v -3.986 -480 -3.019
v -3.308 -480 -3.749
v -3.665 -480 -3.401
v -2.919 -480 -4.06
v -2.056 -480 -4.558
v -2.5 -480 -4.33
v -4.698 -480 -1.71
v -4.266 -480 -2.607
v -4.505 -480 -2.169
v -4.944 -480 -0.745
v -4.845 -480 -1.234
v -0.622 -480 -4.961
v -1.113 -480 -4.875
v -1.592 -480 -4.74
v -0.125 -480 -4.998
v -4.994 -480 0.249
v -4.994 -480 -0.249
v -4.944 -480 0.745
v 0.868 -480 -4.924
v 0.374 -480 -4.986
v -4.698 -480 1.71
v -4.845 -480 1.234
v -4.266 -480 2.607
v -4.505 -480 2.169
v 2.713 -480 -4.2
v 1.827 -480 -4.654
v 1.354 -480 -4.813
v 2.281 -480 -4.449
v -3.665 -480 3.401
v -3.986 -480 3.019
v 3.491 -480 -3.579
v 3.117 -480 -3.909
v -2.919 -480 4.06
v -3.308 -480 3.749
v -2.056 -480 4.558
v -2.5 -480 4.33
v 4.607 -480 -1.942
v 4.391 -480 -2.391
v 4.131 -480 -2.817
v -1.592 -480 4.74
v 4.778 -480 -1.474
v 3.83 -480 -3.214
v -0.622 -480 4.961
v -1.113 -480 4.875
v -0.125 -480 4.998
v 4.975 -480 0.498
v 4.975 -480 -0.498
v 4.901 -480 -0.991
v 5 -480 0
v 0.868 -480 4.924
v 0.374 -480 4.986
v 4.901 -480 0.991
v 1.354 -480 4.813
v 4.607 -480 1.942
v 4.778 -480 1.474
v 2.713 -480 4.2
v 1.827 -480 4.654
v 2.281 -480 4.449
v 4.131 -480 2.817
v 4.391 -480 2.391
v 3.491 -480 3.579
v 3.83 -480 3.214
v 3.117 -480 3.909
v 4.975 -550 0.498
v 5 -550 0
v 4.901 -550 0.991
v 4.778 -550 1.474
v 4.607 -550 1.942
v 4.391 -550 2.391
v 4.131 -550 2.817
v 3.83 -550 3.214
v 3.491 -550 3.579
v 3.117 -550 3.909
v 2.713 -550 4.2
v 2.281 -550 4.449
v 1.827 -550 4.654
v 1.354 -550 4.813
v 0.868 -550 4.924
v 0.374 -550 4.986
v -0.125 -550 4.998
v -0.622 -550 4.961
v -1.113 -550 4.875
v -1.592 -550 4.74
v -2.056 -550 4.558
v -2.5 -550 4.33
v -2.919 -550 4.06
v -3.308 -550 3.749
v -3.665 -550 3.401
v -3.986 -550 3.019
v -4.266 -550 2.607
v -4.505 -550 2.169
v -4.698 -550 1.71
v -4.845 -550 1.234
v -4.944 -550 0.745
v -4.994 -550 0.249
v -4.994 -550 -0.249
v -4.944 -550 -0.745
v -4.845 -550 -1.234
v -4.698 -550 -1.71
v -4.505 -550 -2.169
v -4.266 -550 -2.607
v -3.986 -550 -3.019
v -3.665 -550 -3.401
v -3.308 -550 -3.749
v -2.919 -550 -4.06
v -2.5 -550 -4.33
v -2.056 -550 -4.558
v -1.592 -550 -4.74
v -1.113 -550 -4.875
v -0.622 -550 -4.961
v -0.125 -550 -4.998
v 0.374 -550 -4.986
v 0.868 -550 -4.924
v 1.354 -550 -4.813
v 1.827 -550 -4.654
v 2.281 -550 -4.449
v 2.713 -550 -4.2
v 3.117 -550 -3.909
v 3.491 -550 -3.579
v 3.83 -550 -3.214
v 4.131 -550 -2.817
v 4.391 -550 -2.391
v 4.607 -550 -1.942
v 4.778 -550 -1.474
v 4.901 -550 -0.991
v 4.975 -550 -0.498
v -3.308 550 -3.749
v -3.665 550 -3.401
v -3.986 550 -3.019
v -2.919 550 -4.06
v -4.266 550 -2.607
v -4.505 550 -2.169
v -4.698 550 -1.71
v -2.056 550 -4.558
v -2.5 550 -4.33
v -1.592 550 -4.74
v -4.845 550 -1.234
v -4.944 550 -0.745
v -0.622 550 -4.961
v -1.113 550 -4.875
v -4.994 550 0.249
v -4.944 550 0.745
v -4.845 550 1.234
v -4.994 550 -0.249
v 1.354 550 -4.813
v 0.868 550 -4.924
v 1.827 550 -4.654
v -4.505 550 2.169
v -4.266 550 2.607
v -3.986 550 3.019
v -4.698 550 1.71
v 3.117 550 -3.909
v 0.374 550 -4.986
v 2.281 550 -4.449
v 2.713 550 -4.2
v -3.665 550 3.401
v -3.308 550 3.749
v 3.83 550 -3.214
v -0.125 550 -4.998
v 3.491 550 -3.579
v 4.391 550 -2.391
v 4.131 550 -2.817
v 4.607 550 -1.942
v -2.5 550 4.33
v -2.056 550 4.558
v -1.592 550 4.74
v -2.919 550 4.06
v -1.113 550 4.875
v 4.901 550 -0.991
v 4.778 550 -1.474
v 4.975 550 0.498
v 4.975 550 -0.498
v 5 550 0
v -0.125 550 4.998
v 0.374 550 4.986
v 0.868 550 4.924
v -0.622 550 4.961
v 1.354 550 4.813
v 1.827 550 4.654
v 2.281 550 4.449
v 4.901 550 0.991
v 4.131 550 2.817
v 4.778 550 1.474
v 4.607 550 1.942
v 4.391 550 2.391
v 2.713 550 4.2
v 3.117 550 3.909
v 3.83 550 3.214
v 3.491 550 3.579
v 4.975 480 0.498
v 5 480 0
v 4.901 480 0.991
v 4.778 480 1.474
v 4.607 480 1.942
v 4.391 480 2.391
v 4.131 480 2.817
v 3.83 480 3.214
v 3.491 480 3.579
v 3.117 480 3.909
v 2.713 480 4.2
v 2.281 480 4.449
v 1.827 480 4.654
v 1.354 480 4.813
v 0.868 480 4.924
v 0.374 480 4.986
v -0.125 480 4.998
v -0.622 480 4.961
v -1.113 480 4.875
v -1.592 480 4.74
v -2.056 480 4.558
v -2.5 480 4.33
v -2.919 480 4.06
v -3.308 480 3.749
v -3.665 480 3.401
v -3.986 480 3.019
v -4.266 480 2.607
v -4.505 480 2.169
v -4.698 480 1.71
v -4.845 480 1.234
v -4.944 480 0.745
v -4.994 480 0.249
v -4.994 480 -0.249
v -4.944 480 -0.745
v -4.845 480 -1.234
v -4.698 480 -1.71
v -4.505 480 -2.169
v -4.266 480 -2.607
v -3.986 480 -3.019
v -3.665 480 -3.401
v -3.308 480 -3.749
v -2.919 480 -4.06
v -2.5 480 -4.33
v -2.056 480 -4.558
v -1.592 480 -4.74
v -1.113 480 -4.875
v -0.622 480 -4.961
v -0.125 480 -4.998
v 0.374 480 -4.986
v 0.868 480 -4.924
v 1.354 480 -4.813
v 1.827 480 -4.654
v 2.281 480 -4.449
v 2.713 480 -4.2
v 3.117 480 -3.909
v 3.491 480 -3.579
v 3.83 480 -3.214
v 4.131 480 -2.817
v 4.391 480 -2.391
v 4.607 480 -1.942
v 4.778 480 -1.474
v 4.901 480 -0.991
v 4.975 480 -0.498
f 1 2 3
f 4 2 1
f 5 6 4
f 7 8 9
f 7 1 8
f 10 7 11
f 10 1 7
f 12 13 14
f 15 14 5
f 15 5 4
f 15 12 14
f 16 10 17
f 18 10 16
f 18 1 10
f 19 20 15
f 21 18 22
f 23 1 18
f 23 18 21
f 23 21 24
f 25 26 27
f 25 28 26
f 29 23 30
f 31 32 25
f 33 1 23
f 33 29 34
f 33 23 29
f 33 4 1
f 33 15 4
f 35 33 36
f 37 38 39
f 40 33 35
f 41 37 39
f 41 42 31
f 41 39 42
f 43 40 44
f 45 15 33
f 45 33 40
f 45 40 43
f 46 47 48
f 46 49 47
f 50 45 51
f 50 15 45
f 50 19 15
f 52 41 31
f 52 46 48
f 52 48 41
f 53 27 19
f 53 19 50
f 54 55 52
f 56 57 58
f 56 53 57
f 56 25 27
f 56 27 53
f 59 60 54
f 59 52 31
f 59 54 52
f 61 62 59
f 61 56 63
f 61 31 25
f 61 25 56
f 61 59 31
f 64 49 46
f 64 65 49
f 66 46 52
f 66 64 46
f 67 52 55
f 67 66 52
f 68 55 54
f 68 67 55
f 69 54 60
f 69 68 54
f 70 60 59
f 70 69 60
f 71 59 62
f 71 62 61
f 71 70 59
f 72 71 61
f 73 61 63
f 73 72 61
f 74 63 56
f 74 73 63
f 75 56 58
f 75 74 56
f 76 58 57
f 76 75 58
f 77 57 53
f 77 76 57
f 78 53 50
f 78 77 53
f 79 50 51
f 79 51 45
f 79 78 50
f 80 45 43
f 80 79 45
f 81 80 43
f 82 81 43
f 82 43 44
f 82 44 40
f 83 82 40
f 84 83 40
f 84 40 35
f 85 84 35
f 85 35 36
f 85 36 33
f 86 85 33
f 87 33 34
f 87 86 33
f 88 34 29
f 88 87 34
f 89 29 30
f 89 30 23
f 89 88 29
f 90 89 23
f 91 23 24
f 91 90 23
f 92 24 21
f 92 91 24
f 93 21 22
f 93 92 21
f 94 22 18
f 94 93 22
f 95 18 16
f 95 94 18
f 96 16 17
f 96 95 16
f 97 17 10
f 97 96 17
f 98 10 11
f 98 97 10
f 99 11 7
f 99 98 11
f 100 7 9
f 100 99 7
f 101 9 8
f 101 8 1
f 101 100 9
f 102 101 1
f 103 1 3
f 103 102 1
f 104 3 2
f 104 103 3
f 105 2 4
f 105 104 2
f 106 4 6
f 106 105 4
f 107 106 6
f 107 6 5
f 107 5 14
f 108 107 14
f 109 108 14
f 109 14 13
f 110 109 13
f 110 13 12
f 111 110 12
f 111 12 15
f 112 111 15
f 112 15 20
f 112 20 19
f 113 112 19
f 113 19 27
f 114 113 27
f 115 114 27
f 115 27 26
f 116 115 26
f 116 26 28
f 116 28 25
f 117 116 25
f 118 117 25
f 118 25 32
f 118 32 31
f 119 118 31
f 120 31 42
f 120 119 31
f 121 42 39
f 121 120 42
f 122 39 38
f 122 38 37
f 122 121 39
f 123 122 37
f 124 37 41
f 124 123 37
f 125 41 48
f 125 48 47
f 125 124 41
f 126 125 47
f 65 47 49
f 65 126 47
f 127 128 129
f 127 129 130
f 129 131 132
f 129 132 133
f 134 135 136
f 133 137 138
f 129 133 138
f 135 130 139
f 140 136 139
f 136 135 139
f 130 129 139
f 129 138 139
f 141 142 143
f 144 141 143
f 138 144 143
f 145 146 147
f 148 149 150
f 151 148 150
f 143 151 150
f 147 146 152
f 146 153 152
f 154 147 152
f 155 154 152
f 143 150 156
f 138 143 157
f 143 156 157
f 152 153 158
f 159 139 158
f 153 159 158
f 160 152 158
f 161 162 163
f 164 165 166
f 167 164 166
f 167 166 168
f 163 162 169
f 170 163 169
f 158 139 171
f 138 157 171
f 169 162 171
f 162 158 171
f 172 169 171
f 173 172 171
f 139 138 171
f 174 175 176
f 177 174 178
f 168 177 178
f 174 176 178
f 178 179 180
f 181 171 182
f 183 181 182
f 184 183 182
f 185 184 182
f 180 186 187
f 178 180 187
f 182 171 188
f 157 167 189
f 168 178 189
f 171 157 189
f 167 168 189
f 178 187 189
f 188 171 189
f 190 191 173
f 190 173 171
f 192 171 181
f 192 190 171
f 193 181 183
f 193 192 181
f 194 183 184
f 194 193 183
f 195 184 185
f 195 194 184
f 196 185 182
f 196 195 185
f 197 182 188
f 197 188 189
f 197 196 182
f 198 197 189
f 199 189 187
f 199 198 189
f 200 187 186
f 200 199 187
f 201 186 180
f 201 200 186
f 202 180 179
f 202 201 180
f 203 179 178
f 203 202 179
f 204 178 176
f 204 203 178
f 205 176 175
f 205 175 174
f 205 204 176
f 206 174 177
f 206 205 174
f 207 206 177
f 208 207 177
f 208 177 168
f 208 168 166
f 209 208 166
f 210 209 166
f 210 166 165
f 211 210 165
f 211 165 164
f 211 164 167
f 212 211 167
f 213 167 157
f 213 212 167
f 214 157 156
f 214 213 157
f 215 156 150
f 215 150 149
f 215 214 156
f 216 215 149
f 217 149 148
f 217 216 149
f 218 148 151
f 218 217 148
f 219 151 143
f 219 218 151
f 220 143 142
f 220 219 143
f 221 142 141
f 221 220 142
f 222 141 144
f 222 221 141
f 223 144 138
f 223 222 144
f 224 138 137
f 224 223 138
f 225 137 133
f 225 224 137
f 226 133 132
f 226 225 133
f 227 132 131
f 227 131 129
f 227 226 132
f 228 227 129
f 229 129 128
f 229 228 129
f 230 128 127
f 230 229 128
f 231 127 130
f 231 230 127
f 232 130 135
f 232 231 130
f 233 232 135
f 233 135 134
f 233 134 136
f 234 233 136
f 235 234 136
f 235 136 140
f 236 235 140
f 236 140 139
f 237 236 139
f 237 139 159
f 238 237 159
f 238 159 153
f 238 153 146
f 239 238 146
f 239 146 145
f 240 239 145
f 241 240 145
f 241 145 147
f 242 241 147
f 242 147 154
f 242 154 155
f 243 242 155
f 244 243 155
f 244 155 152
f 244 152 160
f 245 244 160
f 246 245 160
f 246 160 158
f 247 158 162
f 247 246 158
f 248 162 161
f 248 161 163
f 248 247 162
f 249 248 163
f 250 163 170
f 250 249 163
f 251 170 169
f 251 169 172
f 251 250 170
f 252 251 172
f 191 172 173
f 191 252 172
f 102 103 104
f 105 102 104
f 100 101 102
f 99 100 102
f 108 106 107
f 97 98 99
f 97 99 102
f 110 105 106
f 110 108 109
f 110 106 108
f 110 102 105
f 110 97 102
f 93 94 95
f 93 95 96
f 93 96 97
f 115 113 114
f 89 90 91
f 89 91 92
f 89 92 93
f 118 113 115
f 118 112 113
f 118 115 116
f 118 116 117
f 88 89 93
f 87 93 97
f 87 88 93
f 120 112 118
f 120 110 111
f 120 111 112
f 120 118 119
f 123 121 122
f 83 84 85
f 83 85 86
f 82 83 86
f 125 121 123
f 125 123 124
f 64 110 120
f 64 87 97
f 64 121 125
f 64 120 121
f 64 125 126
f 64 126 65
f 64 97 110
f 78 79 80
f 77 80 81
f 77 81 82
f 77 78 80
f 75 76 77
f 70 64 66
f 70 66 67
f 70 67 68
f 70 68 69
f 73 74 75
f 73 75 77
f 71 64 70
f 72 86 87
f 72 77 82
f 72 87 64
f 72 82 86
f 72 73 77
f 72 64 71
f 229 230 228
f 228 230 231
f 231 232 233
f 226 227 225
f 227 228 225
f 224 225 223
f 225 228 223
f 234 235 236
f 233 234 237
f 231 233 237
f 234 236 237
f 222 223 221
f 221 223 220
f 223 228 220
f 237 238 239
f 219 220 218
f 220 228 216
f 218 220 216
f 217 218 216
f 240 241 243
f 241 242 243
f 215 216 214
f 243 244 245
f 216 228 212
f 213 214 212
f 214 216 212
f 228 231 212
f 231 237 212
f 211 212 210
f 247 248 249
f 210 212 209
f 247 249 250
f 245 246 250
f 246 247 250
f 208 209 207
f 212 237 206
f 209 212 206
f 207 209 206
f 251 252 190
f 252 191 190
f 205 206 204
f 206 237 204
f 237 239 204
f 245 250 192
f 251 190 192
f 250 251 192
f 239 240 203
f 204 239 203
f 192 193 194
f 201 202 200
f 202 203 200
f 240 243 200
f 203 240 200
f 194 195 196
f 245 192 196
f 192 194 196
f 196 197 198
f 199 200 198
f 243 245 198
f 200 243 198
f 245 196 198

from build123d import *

# Parameters (mm, degrees)
RECTANGLE_W      = 960
RECTANGLE_H      = 960
EXTRUDE019_DEPTH = 30
SKETCH018_R      = 5
EXTRUDE018_DEPTH = 550


with BuildPart() as extrude019:
    # Rectangle → Extrude019 (new body)
    with BuildSketch(Plane(origin=(10, -480, -480), x_dir=(0, 1, 0), z_dir=(1, 0, 0))):
        with Locations((480, 480)):
            Rectangle(RECTANGLE_W, RECTANGLE_H)
    extrude(amount=-EXTRUDE019_DEPTH)


with BuildPart() as cut:
    # Sketch018 → Extrude018 (new body, symmetric)
    with BuildSketch(Plane.XZ):
        Circle(SKETCH018_R)
    extrude(amount=EXTRUDE018_DEPTH, both=True)

    # Cut: cut Extrude019
    add(extrude019.part, mode=Mode.SUBTRACT)


solid = cut.part
